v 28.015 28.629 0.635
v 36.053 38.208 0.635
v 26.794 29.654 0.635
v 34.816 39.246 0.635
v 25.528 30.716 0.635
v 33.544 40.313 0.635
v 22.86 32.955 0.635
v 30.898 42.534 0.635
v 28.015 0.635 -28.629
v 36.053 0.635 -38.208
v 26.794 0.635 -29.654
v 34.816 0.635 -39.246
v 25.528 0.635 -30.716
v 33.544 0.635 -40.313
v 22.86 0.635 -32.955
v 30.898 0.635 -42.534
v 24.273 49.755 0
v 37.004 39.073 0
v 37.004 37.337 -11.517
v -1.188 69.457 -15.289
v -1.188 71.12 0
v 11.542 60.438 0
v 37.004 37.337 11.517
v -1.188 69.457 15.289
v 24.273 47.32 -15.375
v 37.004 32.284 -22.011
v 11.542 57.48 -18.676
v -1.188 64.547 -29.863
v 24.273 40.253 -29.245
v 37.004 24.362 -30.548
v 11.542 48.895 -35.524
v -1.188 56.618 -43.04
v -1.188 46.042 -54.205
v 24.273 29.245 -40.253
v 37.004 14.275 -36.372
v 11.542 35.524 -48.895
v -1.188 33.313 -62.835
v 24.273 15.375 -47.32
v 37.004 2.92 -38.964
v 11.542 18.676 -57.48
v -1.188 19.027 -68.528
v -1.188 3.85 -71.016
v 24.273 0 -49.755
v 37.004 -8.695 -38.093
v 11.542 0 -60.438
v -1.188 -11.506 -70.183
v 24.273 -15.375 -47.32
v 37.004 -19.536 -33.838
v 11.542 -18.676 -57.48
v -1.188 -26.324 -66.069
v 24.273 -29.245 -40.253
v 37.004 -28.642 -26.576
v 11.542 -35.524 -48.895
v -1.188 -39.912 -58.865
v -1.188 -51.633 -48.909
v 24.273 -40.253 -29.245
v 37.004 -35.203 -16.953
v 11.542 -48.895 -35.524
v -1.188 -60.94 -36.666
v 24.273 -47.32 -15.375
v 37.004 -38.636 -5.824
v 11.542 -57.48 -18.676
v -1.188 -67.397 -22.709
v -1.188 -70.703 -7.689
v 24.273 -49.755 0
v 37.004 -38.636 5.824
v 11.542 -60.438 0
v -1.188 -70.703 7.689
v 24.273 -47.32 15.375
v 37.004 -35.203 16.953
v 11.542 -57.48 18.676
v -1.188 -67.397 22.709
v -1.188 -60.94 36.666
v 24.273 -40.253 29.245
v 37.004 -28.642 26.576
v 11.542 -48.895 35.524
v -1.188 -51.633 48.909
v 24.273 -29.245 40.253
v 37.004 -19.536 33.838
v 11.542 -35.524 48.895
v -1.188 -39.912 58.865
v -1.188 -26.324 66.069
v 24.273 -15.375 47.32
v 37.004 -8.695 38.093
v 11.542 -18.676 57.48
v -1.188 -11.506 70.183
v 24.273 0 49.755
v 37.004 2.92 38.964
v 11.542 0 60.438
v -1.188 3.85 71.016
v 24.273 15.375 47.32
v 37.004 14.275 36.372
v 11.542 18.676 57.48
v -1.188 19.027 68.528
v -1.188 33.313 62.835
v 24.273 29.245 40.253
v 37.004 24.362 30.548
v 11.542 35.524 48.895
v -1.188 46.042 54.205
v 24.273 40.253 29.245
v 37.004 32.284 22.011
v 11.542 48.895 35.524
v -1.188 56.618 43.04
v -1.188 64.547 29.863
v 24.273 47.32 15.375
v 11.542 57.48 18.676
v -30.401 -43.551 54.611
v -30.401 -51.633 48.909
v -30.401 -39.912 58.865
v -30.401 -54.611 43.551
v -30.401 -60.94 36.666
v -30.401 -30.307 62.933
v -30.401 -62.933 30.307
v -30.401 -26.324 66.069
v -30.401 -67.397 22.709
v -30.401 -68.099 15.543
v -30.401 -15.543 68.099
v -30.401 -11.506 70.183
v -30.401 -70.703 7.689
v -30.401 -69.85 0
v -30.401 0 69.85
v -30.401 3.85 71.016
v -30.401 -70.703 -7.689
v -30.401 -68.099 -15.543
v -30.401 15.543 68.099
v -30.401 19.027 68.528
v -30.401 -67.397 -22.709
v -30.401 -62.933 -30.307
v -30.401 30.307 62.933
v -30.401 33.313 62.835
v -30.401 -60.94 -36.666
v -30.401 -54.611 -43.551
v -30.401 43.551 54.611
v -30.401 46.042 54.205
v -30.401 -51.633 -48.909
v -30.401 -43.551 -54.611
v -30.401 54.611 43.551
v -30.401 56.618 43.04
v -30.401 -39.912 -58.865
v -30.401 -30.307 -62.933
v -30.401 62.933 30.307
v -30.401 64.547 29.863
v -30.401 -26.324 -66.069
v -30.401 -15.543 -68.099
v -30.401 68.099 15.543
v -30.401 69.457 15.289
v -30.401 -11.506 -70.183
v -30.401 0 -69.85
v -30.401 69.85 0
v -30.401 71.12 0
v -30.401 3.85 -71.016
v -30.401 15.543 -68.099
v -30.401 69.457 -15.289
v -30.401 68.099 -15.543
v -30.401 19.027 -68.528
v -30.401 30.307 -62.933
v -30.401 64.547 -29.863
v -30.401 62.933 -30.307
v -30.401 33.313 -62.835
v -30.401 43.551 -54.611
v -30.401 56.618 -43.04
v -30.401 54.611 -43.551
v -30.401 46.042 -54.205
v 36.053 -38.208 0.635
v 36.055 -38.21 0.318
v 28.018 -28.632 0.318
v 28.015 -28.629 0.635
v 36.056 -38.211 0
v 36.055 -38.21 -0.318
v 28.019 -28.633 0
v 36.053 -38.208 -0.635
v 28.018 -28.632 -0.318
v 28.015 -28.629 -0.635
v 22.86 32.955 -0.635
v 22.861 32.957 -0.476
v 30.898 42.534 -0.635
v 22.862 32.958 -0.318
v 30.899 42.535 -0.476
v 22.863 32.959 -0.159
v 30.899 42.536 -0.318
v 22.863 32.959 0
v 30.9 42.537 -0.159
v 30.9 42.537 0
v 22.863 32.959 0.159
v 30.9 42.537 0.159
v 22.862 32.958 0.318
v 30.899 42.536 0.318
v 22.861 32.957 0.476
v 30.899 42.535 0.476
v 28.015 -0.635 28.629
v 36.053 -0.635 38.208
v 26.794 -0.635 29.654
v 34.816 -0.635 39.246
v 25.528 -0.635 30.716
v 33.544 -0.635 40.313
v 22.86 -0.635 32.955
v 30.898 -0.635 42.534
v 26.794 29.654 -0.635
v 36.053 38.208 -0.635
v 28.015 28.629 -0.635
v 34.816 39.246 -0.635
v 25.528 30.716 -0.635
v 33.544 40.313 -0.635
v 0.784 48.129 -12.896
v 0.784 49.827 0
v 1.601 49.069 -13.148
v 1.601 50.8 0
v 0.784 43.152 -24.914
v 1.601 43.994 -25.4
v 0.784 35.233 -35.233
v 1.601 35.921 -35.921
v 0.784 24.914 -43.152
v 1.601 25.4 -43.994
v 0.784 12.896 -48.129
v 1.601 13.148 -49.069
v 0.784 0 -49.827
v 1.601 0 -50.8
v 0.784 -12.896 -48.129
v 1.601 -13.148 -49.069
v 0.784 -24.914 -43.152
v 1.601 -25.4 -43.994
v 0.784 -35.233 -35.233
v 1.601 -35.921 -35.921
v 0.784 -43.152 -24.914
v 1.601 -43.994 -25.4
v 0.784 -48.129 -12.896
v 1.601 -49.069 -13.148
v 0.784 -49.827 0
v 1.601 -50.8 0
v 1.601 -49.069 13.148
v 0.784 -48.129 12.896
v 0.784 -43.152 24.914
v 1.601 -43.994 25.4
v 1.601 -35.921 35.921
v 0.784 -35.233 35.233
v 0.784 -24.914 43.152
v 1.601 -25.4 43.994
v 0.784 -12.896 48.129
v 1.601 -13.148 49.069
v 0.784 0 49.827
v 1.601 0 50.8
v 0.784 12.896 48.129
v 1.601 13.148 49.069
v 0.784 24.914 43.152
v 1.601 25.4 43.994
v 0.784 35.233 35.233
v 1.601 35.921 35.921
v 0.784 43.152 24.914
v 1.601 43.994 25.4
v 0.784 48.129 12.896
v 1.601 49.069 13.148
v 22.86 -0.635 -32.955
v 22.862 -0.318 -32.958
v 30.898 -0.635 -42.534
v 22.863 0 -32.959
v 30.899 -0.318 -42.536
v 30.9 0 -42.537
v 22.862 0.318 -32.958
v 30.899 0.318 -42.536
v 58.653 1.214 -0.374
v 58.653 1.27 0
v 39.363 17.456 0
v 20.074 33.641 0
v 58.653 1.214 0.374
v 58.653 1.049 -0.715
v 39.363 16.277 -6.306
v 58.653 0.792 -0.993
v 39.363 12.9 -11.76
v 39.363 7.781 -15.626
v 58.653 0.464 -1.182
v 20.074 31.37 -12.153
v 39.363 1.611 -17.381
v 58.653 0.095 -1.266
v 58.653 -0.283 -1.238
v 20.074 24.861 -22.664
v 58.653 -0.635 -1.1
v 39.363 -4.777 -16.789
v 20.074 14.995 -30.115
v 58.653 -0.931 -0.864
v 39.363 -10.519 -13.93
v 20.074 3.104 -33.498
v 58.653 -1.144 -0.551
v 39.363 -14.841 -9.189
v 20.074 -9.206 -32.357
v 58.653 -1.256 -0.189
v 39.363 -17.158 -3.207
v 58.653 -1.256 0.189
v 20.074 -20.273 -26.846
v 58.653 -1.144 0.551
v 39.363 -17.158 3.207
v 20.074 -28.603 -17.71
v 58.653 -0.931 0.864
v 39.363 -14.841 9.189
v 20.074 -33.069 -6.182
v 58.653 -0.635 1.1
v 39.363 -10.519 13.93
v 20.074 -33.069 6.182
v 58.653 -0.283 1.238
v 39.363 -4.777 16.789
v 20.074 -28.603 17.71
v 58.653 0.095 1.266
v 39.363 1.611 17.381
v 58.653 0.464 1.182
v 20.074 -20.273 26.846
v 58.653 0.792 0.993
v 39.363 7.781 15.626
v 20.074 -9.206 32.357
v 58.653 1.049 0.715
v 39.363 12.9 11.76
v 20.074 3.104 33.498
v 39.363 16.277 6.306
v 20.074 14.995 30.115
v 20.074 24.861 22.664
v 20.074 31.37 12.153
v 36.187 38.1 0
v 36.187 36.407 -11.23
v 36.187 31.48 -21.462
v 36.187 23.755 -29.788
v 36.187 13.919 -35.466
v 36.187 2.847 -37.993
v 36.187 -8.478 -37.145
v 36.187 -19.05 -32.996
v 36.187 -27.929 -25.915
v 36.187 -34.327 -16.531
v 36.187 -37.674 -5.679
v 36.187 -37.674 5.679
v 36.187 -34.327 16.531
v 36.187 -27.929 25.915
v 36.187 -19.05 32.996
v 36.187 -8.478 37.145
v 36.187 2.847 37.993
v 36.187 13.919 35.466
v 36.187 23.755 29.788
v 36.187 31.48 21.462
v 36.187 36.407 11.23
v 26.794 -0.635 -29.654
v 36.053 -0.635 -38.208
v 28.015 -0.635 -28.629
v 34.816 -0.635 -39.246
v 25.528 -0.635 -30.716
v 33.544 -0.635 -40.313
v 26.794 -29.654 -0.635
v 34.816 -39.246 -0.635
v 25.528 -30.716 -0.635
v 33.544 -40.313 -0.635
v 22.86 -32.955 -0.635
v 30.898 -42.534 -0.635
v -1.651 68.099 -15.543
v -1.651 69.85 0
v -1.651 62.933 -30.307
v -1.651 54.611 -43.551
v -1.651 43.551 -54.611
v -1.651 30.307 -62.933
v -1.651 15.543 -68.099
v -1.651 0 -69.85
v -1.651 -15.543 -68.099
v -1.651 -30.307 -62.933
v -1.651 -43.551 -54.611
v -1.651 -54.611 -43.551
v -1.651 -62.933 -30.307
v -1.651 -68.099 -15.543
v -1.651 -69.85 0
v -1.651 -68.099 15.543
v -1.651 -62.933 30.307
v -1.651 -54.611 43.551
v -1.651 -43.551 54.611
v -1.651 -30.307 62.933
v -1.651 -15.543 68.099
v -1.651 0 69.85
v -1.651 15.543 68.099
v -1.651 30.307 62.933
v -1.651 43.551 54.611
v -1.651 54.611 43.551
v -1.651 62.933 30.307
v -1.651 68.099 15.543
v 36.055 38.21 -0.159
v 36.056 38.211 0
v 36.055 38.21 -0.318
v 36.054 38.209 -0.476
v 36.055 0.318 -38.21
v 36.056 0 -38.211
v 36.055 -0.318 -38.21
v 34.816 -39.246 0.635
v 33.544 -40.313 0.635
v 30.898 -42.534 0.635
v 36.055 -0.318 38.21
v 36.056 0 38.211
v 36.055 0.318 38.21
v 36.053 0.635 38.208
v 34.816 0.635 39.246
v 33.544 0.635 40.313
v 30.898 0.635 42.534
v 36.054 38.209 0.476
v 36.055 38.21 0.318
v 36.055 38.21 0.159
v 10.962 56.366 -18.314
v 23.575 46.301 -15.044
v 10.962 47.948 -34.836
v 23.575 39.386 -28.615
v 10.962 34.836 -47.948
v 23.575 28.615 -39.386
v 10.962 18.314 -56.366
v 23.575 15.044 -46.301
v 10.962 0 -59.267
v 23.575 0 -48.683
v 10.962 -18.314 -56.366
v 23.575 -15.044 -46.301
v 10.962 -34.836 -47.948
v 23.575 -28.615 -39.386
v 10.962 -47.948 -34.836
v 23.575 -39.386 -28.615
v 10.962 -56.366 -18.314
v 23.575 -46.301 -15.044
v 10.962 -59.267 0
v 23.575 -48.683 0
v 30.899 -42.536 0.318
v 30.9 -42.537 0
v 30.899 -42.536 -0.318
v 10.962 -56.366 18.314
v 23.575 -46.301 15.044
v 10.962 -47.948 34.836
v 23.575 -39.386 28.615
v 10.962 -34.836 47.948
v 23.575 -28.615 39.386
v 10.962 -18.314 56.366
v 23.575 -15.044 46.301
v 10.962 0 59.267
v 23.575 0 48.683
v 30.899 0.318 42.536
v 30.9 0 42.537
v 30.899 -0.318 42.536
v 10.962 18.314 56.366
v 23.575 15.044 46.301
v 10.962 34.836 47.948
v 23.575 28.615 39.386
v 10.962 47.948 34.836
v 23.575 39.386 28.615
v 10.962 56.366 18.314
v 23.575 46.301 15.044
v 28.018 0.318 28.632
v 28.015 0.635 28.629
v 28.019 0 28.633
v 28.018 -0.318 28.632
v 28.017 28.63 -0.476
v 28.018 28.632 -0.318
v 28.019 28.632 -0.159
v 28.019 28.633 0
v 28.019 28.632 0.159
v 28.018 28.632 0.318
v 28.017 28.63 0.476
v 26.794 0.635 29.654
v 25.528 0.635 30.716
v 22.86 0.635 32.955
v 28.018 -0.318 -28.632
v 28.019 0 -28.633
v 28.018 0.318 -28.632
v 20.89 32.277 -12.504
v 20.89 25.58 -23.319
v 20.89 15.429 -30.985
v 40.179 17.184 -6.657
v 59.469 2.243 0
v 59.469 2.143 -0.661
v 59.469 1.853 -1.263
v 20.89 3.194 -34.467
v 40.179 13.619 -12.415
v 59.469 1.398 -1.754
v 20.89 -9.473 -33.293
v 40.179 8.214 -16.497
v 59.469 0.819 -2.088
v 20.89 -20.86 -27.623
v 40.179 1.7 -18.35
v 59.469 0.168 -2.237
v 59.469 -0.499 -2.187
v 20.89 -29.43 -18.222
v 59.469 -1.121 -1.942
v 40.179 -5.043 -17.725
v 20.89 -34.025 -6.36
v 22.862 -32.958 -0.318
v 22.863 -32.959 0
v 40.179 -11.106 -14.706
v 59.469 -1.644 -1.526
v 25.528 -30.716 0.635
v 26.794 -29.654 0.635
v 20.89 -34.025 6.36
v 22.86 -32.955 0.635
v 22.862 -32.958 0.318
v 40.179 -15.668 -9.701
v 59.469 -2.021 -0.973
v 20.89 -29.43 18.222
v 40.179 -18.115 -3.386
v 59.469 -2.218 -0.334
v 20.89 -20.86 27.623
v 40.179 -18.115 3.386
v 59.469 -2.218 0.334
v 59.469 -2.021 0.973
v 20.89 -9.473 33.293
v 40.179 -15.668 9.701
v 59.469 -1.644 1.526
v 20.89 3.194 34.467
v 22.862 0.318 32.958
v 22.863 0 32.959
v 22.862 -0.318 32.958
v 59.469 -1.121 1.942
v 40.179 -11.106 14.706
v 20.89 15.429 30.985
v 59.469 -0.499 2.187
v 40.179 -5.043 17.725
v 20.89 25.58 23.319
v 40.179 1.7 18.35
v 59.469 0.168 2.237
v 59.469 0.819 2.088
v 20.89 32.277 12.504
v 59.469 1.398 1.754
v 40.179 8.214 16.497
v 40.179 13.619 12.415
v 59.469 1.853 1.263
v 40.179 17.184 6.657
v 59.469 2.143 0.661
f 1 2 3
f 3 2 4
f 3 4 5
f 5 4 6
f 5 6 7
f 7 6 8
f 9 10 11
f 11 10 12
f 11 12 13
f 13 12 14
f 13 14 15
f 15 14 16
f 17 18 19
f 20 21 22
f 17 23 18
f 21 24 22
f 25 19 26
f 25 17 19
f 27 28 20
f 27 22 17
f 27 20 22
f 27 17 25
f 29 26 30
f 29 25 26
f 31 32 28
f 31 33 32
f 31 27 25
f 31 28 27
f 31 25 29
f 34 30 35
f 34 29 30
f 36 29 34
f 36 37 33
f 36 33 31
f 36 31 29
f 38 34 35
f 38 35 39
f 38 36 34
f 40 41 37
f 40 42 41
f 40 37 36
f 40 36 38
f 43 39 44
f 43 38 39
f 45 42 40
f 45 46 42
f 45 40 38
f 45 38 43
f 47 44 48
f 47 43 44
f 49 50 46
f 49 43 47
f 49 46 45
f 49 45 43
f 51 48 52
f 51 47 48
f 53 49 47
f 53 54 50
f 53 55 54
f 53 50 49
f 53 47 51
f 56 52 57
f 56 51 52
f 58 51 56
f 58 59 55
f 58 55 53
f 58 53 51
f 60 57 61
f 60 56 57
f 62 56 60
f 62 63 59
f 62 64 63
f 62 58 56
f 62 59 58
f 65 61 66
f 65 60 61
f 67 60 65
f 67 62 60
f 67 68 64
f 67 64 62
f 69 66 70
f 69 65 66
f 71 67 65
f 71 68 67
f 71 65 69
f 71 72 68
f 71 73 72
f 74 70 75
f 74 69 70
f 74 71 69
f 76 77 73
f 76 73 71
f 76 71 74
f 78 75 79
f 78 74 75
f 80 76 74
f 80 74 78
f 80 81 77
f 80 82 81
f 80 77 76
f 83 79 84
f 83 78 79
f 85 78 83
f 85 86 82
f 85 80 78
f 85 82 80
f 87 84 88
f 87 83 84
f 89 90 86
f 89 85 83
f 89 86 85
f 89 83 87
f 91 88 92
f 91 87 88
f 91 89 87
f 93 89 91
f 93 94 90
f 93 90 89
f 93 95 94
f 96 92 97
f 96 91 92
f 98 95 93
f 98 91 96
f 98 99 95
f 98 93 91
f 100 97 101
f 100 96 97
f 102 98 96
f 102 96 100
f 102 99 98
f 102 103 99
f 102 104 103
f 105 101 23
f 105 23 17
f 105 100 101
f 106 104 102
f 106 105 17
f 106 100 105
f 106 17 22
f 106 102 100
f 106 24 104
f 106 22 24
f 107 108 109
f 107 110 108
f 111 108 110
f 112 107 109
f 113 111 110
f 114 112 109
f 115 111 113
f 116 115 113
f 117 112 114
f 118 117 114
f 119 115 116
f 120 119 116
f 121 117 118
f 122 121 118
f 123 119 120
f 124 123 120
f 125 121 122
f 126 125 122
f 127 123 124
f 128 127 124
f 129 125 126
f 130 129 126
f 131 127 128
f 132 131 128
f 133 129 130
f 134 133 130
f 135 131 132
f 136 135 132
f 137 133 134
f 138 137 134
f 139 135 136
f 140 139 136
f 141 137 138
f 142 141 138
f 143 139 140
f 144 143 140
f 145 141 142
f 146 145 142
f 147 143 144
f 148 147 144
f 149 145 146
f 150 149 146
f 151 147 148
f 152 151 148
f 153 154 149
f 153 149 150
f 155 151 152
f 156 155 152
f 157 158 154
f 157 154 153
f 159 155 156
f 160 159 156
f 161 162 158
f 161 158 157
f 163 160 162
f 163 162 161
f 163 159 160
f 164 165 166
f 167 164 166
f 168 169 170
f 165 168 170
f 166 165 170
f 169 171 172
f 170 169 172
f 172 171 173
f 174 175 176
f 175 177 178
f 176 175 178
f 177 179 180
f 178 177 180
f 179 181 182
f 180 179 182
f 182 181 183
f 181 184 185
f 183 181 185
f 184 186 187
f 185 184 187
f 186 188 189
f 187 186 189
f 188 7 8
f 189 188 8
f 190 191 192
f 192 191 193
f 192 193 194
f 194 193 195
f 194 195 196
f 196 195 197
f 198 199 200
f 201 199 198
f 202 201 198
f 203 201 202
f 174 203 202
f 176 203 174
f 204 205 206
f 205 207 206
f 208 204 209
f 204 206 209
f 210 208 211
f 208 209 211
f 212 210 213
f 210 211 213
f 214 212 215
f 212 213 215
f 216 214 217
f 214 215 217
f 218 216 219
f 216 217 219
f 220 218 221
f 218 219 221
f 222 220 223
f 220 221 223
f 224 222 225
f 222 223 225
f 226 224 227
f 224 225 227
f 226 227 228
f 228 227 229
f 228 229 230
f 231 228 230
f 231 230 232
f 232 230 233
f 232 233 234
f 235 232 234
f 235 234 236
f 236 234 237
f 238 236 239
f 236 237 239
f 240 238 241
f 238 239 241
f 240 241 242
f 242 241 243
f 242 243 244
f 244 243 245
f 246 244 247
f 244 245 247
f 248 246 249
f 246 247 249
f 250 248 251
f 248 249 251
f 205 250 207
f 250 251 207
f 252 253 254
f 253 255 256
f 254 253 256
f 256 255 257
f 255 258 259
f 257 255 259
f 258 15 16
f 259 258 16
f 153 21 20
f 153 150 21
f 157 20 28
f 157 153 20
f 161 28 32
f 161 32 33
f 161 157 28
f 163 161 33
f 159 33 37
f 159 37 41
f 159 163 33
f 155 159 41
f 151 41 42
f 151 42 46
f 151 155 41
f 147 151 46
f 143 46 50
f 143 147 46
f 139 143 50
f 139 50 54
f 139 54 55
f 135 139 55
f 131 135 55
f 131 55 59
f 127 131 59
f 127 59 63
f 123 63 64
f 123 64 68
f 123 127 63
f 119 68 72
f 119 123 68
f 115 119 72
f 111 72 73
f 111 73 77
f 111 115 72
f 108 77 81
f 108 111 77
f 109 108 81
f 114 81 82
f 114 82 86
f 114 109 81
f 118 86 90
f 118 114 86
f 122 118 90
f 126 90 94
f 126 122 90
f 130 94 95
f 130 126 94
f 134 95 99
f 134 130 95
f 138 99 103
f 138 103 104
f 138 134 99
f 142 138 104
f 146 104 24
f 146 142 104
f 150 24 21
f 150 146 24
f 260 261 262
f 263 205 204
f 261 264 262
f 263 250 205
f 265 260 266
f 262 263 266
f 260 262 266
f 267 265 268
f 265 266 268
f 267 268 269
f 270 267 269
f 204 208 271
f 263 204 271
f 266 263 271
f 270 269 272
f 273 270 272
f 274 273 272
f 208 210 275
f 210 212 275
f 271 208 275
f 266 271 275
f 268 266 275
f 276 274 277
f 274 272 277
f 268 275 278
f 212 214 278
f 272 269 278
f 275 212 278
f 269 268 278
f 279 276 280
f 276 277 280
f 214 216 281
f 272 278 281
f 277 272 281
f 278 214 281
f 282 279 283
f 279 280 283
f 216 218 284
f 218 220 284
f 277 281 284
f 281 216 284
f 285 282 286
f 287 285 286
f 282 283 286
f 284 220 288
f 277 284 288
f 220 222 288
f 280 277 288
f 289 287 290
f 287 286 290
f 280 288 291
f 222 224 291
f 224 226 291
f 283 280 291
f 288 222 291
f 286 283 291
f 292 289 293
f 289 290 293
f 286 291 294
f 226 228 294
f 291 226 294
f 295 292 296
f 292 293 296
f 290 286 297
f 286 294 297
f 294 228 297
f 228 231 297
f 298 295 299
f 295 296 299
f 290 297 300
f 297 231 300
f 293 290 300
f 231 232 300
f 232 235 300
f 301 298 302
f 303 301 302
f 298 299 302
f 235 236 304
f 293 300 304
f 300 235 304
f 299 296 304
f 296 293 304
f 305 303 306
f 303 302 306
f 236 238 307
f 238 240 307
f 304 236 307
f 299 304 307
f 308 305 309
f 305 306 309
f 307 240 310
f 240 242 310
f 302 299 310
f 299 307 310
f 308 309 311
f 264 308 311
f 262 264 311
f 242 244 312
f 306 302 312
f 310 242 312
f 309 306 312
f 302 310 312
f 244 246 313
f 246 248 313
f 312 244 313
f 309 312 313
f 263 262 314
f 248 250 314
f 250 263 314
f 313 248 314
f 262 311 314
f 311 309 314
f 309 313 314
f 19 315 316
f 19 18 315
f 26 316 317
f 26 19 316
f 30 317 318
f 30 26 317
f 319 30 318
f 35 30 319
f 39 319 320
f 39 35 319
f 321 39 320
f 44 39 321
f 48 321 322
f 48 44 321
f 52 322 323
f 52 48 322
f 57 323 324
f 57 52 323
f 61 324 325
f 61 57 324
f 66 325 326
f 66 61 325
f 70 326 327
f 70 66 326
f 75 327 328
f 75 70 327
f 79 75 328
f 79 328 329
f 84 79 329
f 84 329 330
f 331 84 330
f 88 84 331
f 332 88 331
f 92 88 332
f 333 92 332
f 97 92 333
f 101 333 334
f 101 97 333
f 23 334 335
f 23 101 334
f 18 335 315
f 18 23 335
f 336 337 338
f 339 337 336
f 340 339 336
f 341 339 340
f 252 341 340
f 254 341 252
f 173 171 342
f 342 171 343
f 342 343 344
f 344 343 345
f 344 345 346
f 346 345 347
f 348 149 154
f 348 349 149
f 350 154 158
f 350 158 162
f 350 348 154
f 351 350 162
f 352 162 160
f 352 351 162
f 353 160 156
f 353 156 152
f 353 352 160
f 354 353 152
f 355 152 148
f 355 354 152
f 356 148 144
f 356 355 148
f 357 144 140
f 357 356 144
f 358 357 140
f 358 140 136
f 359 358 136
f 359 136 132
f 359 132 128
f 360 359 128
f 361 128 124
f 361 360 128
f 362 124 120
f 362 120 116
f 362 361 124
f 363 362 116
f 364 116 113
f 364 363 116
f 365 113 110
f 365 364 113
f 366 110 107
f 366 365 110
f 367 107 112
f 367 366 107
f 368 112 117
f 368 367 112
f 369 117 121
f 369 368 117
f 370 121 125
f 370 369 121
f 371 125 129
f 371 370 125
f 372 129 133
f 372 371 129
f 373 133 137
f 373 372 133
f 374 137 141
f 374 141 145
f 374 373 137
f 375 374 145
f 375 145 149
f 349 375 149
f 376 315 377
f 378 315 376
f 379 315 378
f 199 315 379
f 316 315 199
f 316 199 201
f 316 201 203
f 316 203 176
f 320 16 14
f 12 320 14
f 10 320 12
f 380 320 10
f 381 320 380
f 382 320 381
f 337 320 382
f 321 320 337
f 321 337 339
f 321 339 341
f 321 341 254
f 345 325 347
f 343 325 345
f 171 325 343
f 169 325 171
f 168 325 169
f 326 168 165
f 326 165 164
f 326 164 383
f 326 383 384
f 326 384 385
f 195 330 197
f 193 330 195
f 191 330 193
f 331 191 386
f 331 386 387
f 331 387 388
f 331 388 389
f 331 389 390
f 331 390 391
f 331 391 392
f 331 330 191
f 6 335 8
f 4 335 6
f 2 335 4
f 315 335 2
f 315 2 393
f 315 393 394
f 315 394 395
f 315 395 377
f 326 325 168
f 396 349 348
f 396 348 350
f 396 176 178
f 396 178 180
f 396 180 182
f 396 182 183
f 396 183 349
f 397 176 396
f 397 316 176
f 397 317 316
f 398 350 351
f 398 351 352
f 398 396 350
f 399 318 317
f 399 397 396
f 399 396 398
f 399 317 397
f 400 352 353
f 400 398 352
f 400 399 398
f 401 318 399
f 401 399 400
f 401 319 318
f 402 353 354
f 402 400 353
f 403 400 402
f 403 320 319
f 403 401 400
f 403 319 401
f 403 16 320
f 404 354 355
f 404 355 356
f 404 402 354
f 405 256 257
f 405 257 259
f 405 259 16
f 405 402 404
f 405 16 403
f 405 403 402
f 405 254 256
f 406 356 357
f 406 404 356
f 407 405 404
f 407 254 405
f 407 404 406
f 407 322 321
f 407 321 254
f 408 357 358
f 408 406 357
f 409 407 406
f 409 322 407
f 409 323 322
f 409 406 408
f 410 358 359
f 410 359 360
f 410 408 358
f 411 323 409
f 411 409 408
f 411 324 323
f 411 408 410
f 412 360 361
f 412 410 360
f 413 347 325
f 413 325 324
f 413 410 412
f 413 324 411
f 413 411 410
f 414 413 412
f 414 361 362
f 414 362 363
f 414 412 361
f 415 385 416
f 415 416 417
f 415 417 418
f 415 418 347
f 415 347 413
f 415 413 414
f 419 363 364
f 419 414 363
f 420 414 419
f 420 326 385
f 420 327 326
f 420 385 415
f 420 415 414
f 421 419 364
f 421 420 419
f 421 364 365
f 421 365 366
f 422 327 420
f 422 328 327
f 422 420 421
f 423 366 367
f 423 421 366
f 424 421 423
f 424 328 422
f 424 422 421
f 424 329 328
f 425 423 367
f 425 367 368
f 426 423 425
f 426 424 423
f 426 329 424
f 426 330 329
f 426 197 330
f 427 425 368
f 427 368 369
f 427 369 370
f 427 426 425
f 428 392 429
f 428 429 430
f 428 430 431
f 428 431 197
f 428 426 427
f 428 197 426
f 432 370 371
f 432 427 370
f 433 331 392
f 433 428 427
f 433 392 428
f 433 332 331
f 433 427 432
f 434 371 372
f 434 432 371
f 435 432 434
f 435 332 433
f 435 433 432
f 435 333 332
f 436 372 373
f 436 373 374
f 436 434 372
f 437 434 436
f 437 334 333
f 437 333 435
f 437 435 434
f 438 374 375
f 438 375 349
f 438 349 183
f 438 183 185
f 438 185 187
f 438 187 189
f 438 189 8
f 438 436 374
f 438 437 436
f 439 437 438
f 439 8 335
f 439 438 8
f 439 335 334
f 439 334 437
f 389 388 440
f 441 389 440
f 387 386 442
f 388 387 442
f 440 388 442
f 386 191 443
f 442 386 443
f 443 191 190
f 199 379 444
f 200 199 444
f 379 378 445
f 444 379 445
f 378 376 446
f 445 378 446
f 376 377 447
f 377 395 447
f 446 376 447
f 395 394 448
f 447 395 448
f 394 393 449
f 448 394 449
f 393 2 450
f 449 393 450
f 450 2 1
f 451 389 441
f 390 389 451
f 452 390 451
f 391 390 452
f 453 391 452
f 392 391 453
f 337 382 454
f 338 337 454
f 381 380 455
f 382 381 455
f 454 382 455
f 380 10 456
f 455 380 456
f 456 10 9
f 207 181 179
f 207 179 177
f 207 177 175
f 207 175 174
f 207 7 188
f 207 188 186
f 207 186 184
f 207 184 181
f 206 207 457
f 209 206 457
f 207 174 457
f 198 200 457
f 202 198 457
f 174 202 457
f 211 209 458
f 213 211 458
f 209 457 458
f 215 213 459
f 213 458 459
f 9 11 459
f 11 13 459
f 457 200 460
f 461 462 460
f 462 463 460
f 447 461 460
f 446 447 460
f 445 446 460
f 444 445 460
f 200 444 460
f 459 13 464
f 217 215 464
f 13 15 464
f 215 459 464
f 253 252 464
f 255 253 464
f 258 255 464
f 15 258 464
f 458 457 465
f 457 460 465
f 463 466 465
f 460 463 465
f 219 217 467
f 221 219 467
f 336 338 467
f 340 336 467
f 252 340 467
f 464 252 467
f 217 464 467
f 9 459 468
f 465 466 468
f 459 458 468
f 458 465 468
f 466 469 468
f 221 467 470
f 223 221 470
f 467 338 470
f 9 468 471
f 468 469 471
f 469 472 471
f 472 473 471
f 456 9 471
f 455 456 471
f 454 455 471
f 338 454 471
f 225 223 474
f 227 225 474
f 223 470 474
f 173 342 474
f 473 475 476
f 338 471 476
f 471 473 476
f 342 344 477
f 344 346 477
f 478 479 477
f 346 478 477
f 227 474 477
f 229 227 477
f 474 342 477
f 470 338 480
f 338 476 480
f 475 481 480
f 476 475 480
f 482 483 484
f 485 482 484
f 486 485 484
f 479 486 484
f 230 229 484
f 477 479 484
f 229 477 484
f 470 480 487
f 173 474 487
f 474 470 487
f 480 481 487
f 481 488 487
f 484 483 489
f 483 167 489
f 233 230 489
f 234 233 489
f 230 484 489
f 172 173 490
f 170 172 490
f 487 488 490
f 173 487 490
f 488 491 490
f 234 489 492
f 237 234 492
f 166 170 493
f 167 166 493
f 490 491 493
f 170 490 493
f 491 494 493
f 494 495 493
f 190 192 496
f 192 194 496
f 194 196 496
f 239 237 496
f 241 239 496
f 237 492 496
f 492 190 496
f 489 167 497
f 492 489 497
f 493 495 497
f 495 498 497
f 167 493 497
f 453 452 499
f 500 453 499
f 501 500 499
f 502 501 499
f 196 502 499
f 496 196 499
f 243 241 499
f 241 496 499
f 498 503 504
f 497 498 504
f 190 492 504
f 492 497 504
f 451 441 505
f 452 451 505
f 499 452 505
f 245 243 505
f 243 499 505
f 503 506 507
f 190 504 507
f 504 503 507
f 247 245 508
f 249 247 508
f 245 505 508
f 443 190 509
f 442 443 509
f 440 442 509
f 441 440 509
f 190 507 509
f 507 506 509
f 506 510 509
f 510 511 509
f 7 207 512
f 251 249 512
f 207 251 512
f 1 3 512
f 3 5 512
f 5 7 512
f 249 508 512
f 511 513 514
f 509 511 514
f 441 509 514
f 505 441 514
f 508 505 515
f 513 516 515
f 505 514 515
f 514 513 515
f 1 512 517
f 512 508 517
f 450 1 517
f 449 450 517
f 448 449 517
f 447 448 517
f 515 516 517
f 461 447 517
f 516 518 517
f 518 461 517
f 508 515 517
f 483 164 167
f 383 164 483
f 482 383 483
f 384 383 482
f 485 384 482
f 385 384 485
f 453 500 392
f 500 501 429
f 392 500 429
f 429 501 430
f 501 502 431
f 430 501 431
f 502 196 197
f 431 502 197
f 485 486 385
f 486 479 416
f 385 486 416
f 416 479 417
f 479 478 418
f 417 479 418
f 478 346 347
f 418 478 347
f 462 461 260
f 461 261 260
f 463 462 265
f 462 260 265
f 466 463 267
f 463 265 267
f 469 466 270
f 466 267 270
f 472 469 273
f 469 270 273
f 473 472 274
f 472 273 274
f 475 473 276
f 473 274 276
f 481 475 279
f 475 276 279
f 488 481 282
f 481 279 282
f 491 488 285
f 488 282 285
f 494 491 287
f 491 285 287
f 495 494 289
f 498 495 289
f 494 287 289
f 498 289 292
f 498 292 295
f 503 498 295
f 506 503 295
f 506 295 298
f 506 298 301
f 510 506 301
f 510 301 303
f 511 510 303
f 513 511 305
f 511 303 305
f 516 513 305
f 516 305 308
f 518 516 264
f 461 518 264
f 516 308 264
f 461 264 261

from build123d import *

# Parameters (mm, degrees)
BOSS_EXTRUDE1_DEPTH = 0.635
CIRPATTERN1_COUNT   = 4


with BuildPart() as part:
    # Sketch1 → Revolve1 (revolve)
    with BuildSketch(Plane.XY):
        Polygon((-30.401242848, 69.85), (-1.650713674, 69.85), (36.187462891, 38.1), (37.003803155, 39.072876443), (-1.188471476, 71.12), (-30.401242848, 71.12), align=None)
    revolve(axis=Axis((0, 0, 0), (-1, 0, 0)))



with BuildPart() as body_2:
    # Sketch2 → Revolve2 (revolve)
    with BuildSketch(Plane.XY):
        Polygon((0.784405442, 49.827123557), (1.600745706, 50.8), (59.468872152, 2.242876443), (58.652531887, 1.27), align=None)
    revolve(axis=Axis((0, 0, 0), (-1, 0, 0)))


with BuildPart() as part_1:
    add(part.part)

    add(body_2.part)  # Boss-Extrude1 merges body 2
    # Sketch3 → Boss-Extrude1 (add, symmetric)
    with BuildSketch(Plane.XY):
        Polygon((30.952144014, 42.599035585), (36.107835241, 38.272896978), (27.427825795, 27.928464538), (22.272134568, 32.254603145), align=None)
    boss_extrude1 = extrude(amount=BOSS_EXTRUDE1_DEPTH, both=True)

    # CirPattern1: Boss-Extrude1 ×4 about axis
    cirpattern1_axis = Axis((0, 0, 0), (1, 0, 0))
    for i in range(1, CIRPATTERN1_COUNT):
        add(boss_extrude1.rotate(cirpattern1_axis, i * 360 / CIRPATTERN1_COUNT))


solid = part_1.part
